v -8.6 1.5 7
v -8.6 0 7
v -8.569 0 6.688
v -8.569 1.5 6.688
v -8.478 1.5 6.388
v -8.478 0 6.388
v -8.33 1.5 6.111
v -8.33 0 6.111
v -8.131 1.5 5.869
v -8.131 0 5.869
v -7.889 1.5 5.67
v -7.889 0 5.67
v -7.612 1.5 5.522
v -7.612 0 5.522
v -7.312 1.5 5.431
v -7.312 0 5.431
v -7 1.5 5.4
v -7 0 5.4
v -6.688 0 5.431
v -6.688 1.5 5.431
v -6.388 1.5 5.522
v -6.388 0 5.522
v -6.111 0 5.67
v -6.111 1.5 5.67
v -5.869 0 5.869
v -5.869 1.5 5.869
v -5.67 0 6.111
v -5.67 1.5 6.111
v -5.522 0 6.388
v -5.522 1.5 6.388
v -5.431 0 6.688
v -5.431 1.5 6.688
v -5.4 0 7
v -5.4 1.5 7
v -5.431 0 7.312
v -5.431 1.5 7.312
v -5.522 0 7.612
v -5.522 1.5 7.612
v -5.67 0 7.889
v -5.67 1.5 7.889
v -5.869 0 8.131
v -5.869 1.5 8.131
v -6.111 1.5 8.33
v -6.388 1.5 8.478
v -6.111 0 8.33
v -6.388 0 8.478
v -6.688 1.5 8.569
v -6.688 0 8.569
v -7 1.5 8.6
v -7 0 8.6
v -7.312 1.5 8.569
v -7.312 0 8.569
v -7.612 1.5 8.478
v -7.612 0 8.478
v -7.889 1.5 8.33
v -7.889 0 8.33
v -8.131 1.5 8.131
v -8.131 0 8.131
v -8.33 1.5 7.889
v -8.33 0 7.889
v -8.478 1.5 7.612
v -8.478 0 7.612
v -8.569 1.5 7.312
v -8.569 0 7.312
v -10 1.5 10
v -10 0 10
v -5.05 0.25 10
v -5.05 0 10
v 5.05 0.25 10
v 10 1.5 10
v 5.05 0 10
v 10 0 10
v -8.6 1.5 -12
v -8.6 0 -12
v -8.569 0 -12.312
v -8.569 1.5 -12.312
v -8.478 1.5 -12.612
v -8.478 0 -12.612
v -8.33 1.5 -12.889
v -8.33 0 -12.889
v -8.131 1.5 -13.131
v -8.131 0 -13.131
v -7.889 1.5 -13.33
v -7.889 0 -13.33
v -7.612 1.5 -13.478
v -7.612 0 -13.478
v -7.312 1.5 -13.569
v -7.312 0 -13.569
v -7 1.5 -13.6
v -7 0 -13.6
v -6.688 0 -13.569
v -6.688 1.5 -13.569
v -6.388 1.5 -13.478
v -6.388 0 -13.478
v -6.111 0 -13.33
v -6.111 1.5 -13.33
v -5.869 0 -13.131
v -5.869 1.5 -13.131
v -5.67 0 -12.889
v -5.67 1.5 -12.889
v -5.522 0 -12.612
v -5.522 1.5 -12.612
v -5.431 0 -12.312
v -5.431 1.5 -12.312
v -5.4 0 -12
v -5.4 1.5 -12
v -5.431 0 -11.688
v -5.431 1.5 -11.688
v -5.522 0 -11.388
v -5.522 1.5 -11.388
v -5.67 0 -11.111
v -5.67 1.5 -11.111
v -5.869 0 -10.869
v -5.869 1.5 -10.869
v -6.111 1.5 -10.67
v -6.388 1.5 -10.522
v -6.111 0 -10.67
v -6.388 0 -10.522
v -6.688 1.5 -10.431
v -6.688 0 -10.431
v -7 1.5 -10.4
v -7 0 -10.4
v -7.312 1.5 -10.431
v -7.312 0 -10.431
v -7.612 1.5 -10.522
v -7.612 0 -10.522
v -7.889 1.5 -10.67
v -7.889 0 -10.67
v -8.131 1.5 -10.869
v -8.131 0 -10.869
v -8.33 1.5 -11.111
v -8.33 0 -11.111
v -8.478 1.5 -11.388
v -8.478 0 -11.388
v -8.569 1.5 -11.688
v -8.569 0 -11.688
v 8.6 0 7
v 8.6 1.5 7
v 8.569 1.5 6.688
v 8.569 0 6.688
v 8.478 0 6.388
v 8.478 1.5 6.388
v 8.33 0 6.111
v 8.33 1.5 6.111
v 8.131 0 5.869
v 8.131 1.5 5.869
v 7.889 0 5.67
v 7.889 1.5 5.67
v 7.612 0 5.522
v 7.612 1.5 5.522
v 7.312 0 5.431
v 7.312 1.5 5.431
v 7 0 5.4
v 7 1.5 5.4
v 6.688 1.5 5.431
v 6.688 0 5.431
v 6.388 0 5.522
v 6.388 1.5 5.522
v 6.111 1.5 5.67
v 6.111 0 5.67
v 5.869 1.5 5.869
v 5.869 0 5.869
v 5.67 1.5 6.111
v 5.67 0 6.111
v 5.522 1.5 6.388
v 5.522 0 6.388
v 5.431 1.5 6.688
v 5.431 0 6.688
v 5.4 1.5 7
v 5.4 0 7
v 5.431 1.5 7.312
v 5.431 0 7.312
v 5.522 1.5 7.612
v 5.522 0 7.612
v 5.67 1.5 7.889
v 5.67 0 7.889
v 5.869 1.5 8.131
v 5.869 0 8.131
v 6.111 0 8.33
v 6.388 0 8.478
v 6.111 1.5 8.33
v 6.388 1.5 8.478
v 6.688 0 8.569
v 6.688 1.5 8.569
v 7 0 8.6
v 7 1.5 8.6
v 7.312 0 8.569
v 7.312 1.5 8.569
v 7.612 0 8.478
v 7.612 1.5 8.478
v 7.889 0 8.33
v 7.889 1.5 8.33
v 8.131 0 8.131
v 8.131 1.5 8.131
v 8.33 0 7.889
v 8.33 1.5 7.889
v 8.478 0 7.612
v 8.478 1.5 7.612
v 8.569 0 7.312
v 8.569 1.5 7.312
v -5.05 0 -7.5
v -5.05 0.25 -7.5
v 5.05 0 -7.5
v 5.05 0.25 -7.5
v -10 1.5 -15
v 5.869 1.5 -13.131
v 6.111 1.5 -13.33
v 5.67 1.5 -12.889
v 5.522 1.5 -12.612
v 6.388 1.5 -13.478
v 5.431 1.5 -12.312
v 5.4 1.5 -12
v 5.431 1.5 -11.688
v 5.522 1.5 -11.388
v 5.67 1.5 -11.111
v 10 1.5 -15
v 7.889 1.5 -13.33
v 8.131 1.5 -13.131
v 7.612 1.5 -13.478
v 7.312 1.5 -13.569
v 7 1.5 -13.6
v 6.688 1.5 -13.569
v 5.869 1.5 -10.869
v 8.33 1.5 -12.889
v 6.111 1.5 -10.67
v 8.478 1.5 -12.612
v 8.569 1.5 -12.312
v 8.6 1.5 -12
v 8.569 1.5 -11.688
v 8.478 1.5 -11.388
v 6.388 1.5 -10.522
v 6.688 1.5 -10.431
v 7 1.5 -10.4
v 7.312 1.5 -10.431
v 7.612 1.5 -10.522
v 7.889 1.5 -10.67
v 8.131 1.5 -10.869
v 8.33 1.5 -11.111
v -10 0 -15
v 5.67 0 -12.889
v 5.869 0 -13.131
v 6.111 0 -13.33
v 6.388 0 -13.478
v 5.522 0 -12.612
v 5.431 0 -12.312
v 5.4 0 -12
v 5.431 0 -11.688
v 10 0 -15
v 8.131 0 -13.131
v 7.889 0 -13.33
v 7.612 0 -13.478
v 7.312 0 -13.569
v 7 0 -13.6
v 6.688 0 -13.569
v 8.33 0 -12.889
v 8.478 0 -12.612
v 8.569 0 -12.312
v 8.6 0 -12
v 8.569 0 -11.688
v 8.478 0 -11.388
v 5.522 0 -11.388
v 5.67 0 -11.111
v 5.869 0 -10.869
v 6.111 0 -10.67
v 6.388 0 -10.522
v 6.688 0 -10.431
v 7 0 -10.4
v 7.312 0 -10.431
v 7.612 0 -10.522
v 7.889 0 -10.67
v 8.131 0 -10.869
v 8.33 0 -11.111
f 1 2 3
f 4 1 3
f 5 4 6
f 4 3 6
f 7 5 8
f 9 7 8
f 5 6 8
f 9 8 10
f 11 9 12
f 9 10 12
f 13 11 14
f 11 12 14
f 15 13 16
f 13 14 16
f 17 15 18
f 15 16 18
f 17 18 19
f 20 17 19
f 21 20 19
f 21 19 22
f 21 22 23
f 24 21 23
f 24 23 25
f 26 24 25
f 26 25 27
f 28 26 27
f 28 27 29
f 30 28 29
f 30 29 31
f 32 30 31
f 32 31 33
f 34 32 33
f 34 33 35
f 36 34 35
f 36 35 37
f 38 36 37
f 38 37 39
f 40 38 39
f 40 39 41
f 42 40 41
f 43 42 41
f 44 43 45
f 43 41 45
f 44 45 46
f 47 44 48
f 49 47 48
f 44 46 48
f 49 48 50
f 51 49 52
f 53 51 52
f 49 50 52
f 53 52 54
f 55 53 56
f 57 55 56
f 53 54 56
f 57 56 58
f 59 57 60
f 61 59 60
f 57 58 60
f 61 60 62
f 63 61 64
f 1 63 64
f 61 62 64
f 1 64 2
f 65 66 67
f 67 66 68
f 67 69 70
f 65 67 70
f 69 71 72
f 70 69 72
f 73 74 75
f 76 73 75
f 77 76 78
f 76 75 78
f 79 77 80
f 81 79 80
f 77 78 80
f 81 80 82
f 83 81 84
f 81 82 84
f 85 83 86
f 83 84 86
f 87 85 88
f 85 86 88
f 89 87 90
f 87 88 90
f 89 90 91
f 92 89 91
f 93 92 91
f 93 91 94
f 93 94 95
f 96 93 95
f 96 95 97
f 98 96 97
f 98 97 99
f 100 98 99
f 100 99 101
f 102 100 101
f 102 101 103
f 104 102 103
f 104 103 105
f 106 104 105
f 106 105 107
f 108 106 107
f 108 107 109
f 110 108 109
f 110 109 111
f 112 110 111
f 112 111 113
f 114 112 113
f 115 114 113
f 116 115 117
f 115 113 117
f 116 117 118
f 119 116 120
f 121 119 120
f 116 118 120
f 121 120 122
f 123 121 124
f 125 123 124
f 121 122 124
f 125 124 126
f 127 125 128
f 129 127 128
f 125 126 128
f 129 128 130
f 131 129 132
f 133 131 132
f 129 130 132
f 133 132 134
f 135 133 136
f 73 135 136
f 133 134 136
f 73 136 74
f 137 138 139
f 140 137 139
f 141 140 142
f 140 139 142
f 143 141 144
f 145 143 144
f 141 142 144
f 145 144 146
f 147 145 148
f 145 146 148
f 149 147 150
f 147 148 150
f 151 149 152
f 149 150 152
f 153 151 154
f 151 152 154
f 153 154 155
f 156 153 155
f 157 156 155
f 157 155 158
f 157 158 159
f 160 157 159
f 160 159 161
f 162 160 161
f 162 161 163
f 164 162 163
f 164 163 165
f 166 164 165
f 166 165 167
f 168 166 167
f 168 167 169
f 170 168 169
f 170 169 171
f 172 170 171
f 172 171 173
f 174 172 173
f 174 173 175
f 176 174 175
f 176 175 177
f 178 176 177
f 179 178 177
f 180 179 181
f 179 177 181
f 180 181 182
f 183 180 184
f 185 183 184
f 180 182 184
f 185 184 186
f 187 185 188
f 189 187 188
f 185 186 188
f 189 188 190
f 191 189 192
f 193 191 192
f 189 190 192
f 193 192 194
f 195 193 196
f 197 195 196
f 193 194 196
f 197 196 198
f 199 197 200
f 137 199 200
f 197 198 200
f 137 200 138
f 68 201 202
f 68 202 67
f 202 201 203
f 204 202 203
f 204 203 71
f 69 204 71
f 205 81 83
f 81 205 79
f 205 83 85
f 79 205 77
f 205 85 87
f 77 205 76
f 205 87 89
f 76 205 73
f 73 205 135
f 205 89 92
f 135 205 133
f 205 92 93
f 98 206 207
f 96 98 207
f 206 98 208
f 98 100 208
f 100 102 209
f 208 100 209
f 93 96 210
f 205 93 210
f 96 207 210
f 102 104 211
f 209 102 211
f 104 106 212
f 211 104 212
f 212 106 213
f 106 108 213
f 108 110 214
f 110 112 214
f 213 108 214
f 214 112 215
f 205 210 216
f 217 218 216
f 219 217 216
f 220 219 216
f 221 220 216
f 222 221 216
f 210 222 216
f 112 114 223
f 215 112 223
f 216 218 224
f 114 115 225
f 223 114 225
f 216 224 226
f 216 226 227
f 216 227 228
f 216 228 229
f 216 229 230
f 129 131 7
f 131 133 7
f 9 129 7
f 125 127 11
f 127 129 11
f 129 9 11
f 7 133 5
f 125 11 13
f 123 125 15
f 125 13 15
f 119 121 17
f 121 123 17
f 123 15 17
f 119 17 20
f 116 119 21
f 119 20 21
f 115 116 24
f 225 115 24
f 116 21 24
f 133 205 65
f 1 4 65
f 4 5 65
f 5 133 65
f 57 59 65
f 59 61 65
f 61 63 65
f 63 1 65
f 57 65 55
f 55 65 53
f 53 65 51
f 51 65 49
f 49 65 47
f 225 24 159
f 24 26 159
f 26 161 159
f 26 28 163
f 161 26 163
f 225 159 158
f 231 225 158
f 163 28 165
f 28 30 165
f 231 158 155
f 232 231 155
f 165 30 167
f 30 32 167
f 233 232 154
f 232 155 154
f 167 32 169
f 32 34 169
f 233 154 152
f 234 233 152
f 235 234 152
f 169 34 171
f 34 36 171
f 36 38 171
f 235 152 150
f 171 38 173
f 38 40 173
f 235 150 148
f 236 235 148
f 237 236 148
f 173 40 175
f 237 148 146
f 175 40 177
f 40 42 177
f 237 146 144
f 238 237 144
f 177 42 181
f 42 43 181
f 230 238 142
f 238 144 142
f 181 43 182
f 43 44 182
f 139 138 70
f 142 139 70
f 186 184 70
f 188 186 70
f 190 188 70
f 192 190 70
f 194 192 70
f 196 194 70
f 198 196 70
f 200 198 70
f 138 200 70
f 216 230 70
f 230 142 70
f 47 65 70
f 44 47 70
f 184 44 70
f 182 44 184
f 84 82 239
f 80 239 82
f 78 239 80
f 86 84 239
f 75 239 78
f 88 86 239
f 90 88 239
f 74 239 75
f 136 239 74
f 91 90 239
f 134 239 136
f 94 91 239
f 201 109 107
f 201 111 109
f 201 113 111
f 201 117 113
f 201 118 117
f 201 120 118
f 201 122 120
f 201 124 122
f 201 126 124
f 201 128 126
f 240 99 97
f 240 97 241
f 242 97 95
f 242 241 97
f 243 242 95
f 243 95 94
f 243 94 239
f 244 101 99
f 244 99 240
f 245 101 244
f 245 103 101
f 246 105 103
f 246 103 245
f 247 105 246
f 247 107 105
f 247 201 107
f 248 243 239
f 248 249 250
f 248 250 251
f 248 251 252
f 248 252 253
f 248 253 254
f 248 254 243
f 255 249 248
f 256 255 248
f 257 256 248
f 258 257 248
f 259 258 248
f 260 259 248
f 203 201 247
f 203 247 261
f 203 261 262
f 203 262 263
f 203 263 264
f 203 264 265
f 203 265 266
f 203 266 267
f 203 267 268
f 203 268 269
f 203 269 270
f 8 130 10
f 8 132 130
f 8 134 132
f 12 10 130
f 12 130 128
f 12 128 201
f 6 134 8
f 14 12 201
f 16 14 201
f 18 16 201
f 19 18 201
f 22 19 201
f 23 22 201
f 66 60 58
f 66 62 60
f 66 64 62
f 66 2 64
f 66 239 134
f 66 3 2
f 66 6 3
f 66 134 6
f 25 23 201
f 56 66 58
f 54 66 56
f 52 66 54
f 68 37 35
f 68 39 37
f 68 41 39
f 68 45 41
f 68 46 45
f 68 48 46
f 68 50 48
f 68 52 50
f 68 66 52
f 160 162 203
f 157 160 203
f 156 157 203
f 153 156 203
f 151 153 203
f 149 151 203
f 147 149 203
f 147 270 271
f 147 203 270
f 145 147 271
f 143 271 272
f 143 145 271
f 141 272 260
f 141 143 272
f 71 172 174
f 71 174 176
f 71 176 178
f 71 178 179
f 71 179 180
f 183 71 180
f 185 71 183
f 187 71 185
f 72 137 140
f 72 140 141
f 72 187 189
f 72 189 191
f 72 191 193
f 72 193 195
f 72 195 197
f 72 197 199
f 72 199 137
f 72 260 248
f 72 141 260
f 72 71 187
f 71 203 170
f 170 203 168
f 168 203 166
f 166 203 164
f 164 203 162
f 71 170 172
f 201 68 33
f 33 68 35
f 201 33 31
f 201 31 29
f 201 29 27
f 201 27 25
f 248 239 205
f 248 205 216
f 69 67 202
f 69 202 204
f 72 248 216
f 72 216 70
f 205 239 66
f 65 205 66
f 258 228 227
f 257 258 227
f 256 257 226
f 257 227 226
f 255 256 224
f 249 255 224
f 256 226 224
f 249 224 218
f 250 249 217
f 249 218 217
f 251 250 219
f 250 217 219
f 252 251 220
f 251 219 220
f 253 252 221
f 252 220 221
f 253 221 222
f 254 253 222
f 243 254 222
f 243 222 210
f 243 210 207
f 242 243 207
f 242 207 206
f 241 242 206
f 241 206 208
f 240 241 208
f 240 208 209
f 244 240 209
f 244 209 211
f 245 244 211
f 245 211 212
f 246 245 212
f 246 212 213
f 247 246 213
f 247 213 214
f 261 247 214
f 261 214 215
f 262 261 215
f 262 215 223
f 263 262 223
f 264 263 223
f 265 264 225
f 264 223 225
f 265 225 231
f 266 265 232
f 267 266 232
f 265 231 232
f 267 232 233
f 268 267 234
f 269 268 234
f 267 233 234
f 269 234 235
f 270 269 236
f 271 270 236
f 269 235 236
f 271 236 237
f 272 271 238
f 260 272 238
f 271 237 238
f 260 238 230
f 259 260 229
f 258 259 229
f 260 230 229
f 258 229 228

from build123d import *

# Parameters (mm, degrees)
SKETCH_1_W              = 20
SKETCH_1_H              = 25
EXTRUDE_1_DEPTH         = 1.5
SKETCH_2_W              = 10.1
SKETCH_2_H              = 17.5
CUT_EXTRUDE_1_DEPTH     = 0.25
HOLE_WIZARD_3_2_3_2_1_D = 3.2
HOLE_WIZARD_3_2_3_2_2_D = 3.2


with BuildPart() as part:
    # 草图1 → 凸台-拉伸1 (new body)
    with BuildSketch(Plane.XZ):
        with Locations((0, -2.5)):
            Rectangle(SKETCH_1_W, SKETCH_1_H)
    extrude(amount=-EXTRUDE_1_DEPTH)

    # 草图2 → 切除-拉伸1 (cut)
    with BuildSketch(Plane.XZ):
        with Locations((0, 1.25)):
            Rectangle(SKETCH_2_W, SKETCH_2_H)
    extrude(amount=-CUT_EXTRUDE_1_DEPTH, mode=Mode.SUBTRACT)

    # Ø3.2 (3.2) 直径孔1 (through all)
    with Locations(Plane(origin=(0, 0, 0), x_dir=(-1, 0, 0), z_dir=(0, -1, 0))):
        with Locations((-7, -7), (-7, 12)):
            Hole(HOLE_WIZARD_3_2_3_2_1_D / 2)

    # Ø3.2 (3.2) 直径孔2 (through all)
    with Locations(Plane(origin=(0, 1.5, 0), x_dir=(1, 0, 0), z_dir=(0, 1, 0))):
        with Locations((-7, -7), (-7, 12)):
            Hole(HOLE_WIZARD_3_2_3_2_2_D / 2)


solid = part.part
